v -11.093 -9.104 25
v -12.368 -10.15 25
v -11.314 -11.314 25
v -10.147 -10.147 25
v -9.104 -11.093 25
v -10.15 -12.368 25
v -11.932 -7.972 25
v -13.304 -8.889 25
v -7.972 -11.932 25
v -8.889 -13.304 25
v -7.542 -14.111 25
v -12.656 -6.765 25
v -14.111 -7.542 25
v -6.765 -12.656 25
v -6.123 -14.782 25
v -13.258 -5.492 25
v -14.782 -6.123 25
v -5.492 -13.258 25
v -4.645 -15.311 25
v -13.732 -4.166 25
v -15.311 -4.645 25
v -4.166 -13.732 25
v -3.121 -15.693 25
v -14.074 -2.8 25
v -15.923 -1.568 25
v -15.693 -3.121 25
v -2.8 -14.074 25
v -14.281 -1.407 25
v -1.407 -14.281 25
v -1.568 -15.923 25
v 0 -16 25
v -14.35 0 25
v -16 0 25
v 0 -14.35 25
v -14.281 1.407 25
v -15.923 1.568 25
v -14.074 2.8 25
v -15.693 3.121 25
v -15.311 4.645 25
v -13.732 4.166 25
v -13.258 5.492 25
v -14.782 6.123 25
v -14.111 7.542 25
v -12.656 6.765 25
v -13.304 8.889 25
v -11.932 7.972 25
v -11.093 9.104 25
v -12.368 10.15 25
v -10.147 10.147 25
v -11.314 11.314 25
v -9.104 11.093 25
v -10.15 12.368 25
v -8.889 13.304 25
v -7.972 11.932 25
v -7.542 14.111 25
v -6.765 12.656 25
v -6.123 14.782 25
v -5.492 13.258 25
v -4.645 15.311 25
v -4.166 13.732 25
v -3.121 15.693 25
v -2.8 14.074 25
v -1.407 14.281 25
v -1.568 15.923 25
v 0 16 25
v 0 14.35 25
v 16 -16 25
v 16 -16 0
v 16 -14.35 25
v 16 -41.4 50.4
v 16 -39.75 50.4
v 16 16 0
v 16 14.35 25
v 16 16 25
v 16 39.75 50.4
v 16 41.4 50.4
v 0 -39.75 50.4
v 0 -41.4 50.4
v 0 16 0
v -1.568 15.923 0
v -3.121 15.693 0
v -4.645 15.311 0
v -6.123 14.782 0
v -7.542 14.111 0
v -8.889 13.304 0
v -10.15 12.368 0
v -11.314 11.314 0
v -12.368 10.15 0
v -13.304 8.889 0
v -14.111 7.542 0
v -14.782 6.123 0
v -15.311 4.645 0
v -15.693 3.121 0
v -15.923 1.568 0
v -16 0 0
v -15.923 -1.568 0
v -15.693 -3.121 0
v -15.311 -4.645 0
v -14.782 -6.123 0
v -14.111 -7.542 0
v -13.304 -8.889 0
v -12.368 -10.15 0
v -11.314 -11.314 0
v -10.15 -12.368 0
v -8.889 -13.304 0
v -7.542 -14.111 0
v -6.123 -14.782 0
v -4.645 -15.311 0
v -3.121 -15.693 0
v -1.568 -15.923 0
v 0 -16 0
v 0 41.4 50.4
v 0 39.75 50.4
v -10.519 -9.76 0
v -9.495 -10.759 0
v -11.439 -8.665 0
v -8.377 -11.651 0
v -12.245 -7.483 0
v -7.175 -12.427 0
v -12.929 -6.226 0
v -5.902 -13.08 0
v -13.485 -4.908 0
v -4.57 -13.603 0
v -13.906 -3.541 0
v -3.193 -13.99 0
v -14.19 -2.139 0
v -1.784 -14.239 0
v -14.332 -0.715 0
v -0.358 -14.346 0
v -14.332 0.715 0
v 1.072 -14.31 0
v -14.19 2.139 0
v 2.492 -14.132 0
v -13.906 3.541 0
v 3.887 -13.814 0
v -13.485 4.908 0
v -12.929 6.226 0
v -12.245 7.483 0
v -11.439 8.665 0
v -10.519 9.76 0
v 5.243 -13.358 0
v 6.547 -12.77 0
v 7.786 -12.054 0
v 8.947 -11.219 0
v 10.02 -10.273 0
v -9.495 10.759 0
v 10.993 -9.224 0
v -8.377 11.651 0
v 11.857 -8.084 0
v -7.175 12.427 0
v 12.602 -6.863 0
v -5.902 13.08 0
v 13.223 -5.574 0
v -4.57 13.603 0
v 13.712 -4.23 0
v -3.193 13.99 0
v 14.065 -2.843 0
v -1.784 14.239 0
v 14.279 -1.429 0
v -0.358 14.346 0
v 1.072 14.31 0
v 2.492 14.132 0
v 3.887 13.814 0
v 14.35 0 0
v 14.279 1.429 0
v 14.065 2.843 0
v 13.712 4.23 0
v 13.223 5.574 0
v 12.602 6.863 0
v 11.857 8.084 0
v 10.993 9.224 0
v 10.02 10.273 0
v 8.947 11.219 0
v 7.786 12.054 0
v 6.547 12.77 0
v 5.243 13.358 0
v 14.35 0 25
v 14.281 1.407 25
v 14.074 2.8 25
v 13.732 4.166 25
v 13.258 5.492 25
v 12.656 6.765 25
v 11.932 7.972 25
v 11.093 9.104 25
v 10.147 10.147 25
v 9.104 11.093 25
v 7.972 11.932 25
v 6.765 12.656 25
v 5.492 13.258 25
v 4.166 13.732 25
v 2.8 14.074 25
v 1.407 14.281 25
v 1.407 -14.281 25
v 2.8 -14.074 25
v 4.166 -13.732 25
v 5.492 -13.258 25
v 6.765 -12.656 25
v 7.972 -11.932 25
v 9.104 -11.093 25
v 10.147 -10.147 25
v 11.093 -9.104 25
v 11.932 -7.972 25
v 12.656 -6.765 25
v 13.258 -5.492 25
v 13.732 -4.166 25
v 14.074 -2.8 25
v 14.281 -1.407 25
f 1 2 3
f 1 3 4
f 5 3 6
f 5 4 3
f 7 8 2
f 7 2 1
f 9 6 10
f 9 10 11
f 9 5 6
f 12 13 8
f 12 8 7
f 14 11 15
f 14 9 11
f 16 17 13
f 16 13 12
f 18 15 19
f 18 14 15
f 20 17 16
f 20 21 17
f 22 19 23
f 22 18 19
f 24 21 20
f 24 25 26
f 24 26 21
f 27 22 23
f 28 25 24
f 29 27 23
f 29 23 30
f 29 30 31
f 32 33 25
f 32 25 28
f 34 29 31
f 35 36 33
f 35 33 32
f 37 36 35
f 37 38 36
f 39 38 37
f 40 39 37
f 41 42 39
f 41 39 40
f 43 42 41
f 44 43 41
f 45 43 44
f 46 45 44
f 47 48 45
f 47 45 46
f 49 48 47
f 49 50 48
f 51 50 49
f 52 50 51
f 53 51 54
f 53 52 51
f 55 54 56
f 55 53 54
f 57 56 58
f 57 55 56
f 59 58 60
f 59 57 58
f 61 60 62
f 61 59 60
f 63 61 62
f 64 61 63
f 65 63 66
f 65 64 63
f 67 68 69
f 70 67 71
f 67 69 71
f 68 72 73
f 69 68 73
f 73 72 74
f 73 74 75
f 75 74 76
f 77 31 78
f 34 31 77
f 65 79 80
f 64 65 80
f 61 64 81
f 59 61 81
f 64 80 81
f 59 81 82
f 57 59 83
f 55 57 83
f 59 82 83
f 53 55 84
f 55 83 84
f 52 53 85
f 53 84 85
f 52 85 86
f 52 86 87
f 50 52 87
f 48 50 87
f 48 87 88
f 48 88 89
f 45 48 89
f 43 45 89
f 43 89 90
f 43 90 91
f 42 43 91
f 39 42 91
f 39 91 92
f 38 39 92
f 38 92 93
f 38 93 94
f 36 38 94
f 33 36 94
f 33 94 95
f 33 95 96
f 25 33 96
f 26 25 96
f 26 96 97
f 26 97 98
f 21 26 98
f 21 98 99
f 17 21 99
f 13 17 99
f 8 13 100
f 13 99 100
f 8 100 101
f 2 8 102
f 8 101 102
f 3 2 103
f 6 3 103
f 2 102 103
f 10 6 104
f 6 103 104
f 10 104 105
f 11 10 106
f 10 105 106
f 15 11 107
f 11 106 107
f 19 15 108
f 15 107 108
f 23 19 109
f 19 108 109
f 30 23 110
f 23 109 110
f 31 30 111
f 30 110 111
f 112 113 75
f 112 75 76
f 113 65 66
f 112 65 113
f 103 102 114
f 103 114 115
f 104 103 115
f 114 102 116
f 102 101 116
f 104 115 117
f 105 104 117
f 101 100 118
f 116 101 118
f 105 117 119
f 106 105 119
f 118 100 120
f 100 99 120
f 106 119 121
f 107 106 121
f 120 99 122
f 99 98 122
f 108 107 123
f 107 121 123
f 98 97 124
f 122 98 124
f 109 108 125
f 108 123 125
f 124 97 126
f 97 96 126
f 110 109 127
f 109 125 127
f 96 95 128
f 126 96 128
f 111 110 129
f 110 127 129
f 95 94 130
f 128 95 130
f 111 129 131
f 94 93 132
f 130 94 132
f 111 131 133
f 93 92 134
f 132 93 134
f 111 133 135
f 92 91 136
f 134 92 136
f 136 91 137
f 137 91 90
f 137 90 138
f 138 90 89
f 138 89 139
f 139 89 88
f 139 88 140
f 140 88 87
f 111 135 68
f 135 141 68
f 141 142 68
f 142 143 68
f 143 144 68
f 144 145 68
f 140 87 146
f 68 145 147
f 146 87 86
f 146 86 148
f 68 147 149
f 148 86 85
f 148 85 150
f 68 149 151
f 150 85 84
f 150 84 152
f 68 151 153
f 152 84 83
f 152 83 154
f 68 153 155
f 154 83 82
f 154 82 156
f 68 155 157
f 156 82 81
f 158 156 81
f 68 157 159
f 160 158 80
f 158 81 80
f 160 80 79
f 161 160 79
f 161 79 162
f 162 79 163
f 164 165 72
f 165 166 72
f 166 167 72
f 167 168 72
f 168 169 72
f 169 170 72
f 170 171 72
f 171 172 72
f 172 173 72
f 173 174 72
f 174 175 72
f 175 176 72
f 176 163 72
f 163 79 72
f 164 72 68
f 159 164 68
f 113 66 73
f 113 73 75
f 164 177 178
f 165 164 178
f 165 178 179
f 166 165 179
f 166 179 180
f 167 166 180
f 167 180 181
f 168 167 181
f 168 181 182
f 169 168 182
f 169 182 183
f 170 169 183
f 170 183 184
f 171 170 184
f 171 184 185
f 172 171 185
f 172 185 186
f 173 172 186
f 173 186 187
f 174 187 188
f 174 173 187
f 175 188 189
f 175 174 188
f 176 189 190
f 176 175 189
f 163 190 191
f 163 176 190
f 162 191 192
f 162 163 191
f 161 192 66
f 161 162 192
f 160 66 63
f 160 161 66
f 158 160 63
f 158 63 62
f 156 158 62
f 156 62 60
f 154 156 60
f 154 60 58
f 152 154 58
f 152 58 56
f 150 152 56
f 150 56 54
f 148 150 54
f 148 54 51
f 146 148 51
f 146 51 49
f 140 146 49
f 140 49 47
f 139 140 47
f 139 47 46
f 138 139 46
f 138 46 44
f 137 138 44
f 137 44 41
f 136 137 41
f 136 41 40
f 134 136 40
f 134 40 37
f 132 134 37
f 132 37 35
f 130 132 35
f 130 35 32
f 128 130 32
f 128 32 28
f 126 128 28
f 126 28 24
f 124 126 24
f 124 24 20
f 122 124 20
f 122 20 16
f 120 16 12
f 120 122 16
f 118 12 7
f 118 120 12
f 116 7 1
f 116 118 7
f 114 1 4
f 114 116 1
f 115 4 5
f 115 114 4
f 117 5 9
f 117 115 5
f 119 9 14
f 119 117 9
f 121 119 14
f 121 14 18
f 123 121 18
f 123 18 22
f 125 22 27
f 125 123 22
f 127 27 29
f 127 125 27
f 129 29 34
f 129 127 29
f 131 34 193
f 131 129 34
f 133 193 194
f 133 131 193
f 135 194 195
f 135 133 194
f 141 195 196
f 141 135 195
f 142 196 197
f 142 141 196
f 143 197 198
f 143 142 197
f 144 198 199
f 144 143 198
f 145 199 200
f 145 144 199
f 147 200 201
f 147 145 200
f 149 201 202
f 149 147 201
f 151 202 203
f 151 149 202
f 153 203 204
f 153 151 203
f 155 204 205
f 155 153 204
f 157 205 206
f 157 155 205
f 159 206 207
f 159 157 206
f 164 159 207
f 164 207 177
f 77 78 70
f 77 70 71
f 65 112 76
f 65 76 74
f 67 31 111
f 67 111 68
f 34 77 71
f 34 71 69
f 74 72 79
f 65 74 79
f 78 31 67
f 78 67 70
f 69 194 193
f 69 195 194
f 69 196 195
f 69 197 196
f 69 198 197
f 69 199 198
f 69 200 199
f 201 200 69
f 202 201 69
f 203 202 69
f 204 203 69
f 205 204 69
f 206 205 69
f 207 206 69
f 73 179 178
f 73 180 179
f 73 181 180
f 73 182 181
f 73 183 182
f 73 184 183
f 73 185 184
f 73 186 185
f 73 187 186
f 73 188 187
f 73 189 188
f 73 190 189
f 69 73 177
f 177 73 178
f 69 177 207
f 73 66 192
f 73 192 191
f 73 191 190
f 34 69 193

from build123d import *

# Parameters (mm, degrees)
SKETCH1_R           = 16
SKETCH1_R_2         = 14.35
BOSS_EXTRUDE1_DEPTH = 25
BOSS_EXTRUDE3_DEPTH = 25
BOSS_EXTRUDE4_DEPTH = 16


with BuildPart() as part:
    # Sketch1 → Boss-Extrude1 (new body)
    with BuildSketch(Plane.XY):
        Circle(SKETCH1_R)
        Circle(SKETCH1_R_2, mode=Mode.SUBTRACT)
    extrude(amount=BOSS_EXTRUDE1_DEPTH)

    # Sketch3 → Boss-Extrude3 (add)
    with BuildSketch(Plane.XY):
        with BuildLine():
            Line((16, 16), (0, 16))
            ThreePointArc((0, 16), (11.313708499, 11.313708499), (16, 0))
            Line((16, 0), (16, 16))
        make_face()
        with BuildLine():
            Line((16, -16), (16, 0))
            ThreePointArc((16, 0), (11.313708499, -11.313708499), (0, -16))
            Line((0, -16), (16, -16))
        make_face()
    extrude(amount=BOSS_EXTRUDE3_DEPTH)

    # Sketch2 → Boss-Extrude4 (add)
    with BuildSketch(Plane(origin=(0, 0, 0), x_dir=(0, 0, -1), z_dir=(1, 0, 0))):
        Polygon((-25, 14.35), (-50.4, 39.75), (-50.4, 41.4), (-25, 16), align=None)
        Polygon((-25, -14.35), (-25, -16), (-50.4, -41.4), (-50.4, -39.75), align=None)
    extrude(amount=BOSS_EXTRUDE4_DEPTH)


solid = part.part
